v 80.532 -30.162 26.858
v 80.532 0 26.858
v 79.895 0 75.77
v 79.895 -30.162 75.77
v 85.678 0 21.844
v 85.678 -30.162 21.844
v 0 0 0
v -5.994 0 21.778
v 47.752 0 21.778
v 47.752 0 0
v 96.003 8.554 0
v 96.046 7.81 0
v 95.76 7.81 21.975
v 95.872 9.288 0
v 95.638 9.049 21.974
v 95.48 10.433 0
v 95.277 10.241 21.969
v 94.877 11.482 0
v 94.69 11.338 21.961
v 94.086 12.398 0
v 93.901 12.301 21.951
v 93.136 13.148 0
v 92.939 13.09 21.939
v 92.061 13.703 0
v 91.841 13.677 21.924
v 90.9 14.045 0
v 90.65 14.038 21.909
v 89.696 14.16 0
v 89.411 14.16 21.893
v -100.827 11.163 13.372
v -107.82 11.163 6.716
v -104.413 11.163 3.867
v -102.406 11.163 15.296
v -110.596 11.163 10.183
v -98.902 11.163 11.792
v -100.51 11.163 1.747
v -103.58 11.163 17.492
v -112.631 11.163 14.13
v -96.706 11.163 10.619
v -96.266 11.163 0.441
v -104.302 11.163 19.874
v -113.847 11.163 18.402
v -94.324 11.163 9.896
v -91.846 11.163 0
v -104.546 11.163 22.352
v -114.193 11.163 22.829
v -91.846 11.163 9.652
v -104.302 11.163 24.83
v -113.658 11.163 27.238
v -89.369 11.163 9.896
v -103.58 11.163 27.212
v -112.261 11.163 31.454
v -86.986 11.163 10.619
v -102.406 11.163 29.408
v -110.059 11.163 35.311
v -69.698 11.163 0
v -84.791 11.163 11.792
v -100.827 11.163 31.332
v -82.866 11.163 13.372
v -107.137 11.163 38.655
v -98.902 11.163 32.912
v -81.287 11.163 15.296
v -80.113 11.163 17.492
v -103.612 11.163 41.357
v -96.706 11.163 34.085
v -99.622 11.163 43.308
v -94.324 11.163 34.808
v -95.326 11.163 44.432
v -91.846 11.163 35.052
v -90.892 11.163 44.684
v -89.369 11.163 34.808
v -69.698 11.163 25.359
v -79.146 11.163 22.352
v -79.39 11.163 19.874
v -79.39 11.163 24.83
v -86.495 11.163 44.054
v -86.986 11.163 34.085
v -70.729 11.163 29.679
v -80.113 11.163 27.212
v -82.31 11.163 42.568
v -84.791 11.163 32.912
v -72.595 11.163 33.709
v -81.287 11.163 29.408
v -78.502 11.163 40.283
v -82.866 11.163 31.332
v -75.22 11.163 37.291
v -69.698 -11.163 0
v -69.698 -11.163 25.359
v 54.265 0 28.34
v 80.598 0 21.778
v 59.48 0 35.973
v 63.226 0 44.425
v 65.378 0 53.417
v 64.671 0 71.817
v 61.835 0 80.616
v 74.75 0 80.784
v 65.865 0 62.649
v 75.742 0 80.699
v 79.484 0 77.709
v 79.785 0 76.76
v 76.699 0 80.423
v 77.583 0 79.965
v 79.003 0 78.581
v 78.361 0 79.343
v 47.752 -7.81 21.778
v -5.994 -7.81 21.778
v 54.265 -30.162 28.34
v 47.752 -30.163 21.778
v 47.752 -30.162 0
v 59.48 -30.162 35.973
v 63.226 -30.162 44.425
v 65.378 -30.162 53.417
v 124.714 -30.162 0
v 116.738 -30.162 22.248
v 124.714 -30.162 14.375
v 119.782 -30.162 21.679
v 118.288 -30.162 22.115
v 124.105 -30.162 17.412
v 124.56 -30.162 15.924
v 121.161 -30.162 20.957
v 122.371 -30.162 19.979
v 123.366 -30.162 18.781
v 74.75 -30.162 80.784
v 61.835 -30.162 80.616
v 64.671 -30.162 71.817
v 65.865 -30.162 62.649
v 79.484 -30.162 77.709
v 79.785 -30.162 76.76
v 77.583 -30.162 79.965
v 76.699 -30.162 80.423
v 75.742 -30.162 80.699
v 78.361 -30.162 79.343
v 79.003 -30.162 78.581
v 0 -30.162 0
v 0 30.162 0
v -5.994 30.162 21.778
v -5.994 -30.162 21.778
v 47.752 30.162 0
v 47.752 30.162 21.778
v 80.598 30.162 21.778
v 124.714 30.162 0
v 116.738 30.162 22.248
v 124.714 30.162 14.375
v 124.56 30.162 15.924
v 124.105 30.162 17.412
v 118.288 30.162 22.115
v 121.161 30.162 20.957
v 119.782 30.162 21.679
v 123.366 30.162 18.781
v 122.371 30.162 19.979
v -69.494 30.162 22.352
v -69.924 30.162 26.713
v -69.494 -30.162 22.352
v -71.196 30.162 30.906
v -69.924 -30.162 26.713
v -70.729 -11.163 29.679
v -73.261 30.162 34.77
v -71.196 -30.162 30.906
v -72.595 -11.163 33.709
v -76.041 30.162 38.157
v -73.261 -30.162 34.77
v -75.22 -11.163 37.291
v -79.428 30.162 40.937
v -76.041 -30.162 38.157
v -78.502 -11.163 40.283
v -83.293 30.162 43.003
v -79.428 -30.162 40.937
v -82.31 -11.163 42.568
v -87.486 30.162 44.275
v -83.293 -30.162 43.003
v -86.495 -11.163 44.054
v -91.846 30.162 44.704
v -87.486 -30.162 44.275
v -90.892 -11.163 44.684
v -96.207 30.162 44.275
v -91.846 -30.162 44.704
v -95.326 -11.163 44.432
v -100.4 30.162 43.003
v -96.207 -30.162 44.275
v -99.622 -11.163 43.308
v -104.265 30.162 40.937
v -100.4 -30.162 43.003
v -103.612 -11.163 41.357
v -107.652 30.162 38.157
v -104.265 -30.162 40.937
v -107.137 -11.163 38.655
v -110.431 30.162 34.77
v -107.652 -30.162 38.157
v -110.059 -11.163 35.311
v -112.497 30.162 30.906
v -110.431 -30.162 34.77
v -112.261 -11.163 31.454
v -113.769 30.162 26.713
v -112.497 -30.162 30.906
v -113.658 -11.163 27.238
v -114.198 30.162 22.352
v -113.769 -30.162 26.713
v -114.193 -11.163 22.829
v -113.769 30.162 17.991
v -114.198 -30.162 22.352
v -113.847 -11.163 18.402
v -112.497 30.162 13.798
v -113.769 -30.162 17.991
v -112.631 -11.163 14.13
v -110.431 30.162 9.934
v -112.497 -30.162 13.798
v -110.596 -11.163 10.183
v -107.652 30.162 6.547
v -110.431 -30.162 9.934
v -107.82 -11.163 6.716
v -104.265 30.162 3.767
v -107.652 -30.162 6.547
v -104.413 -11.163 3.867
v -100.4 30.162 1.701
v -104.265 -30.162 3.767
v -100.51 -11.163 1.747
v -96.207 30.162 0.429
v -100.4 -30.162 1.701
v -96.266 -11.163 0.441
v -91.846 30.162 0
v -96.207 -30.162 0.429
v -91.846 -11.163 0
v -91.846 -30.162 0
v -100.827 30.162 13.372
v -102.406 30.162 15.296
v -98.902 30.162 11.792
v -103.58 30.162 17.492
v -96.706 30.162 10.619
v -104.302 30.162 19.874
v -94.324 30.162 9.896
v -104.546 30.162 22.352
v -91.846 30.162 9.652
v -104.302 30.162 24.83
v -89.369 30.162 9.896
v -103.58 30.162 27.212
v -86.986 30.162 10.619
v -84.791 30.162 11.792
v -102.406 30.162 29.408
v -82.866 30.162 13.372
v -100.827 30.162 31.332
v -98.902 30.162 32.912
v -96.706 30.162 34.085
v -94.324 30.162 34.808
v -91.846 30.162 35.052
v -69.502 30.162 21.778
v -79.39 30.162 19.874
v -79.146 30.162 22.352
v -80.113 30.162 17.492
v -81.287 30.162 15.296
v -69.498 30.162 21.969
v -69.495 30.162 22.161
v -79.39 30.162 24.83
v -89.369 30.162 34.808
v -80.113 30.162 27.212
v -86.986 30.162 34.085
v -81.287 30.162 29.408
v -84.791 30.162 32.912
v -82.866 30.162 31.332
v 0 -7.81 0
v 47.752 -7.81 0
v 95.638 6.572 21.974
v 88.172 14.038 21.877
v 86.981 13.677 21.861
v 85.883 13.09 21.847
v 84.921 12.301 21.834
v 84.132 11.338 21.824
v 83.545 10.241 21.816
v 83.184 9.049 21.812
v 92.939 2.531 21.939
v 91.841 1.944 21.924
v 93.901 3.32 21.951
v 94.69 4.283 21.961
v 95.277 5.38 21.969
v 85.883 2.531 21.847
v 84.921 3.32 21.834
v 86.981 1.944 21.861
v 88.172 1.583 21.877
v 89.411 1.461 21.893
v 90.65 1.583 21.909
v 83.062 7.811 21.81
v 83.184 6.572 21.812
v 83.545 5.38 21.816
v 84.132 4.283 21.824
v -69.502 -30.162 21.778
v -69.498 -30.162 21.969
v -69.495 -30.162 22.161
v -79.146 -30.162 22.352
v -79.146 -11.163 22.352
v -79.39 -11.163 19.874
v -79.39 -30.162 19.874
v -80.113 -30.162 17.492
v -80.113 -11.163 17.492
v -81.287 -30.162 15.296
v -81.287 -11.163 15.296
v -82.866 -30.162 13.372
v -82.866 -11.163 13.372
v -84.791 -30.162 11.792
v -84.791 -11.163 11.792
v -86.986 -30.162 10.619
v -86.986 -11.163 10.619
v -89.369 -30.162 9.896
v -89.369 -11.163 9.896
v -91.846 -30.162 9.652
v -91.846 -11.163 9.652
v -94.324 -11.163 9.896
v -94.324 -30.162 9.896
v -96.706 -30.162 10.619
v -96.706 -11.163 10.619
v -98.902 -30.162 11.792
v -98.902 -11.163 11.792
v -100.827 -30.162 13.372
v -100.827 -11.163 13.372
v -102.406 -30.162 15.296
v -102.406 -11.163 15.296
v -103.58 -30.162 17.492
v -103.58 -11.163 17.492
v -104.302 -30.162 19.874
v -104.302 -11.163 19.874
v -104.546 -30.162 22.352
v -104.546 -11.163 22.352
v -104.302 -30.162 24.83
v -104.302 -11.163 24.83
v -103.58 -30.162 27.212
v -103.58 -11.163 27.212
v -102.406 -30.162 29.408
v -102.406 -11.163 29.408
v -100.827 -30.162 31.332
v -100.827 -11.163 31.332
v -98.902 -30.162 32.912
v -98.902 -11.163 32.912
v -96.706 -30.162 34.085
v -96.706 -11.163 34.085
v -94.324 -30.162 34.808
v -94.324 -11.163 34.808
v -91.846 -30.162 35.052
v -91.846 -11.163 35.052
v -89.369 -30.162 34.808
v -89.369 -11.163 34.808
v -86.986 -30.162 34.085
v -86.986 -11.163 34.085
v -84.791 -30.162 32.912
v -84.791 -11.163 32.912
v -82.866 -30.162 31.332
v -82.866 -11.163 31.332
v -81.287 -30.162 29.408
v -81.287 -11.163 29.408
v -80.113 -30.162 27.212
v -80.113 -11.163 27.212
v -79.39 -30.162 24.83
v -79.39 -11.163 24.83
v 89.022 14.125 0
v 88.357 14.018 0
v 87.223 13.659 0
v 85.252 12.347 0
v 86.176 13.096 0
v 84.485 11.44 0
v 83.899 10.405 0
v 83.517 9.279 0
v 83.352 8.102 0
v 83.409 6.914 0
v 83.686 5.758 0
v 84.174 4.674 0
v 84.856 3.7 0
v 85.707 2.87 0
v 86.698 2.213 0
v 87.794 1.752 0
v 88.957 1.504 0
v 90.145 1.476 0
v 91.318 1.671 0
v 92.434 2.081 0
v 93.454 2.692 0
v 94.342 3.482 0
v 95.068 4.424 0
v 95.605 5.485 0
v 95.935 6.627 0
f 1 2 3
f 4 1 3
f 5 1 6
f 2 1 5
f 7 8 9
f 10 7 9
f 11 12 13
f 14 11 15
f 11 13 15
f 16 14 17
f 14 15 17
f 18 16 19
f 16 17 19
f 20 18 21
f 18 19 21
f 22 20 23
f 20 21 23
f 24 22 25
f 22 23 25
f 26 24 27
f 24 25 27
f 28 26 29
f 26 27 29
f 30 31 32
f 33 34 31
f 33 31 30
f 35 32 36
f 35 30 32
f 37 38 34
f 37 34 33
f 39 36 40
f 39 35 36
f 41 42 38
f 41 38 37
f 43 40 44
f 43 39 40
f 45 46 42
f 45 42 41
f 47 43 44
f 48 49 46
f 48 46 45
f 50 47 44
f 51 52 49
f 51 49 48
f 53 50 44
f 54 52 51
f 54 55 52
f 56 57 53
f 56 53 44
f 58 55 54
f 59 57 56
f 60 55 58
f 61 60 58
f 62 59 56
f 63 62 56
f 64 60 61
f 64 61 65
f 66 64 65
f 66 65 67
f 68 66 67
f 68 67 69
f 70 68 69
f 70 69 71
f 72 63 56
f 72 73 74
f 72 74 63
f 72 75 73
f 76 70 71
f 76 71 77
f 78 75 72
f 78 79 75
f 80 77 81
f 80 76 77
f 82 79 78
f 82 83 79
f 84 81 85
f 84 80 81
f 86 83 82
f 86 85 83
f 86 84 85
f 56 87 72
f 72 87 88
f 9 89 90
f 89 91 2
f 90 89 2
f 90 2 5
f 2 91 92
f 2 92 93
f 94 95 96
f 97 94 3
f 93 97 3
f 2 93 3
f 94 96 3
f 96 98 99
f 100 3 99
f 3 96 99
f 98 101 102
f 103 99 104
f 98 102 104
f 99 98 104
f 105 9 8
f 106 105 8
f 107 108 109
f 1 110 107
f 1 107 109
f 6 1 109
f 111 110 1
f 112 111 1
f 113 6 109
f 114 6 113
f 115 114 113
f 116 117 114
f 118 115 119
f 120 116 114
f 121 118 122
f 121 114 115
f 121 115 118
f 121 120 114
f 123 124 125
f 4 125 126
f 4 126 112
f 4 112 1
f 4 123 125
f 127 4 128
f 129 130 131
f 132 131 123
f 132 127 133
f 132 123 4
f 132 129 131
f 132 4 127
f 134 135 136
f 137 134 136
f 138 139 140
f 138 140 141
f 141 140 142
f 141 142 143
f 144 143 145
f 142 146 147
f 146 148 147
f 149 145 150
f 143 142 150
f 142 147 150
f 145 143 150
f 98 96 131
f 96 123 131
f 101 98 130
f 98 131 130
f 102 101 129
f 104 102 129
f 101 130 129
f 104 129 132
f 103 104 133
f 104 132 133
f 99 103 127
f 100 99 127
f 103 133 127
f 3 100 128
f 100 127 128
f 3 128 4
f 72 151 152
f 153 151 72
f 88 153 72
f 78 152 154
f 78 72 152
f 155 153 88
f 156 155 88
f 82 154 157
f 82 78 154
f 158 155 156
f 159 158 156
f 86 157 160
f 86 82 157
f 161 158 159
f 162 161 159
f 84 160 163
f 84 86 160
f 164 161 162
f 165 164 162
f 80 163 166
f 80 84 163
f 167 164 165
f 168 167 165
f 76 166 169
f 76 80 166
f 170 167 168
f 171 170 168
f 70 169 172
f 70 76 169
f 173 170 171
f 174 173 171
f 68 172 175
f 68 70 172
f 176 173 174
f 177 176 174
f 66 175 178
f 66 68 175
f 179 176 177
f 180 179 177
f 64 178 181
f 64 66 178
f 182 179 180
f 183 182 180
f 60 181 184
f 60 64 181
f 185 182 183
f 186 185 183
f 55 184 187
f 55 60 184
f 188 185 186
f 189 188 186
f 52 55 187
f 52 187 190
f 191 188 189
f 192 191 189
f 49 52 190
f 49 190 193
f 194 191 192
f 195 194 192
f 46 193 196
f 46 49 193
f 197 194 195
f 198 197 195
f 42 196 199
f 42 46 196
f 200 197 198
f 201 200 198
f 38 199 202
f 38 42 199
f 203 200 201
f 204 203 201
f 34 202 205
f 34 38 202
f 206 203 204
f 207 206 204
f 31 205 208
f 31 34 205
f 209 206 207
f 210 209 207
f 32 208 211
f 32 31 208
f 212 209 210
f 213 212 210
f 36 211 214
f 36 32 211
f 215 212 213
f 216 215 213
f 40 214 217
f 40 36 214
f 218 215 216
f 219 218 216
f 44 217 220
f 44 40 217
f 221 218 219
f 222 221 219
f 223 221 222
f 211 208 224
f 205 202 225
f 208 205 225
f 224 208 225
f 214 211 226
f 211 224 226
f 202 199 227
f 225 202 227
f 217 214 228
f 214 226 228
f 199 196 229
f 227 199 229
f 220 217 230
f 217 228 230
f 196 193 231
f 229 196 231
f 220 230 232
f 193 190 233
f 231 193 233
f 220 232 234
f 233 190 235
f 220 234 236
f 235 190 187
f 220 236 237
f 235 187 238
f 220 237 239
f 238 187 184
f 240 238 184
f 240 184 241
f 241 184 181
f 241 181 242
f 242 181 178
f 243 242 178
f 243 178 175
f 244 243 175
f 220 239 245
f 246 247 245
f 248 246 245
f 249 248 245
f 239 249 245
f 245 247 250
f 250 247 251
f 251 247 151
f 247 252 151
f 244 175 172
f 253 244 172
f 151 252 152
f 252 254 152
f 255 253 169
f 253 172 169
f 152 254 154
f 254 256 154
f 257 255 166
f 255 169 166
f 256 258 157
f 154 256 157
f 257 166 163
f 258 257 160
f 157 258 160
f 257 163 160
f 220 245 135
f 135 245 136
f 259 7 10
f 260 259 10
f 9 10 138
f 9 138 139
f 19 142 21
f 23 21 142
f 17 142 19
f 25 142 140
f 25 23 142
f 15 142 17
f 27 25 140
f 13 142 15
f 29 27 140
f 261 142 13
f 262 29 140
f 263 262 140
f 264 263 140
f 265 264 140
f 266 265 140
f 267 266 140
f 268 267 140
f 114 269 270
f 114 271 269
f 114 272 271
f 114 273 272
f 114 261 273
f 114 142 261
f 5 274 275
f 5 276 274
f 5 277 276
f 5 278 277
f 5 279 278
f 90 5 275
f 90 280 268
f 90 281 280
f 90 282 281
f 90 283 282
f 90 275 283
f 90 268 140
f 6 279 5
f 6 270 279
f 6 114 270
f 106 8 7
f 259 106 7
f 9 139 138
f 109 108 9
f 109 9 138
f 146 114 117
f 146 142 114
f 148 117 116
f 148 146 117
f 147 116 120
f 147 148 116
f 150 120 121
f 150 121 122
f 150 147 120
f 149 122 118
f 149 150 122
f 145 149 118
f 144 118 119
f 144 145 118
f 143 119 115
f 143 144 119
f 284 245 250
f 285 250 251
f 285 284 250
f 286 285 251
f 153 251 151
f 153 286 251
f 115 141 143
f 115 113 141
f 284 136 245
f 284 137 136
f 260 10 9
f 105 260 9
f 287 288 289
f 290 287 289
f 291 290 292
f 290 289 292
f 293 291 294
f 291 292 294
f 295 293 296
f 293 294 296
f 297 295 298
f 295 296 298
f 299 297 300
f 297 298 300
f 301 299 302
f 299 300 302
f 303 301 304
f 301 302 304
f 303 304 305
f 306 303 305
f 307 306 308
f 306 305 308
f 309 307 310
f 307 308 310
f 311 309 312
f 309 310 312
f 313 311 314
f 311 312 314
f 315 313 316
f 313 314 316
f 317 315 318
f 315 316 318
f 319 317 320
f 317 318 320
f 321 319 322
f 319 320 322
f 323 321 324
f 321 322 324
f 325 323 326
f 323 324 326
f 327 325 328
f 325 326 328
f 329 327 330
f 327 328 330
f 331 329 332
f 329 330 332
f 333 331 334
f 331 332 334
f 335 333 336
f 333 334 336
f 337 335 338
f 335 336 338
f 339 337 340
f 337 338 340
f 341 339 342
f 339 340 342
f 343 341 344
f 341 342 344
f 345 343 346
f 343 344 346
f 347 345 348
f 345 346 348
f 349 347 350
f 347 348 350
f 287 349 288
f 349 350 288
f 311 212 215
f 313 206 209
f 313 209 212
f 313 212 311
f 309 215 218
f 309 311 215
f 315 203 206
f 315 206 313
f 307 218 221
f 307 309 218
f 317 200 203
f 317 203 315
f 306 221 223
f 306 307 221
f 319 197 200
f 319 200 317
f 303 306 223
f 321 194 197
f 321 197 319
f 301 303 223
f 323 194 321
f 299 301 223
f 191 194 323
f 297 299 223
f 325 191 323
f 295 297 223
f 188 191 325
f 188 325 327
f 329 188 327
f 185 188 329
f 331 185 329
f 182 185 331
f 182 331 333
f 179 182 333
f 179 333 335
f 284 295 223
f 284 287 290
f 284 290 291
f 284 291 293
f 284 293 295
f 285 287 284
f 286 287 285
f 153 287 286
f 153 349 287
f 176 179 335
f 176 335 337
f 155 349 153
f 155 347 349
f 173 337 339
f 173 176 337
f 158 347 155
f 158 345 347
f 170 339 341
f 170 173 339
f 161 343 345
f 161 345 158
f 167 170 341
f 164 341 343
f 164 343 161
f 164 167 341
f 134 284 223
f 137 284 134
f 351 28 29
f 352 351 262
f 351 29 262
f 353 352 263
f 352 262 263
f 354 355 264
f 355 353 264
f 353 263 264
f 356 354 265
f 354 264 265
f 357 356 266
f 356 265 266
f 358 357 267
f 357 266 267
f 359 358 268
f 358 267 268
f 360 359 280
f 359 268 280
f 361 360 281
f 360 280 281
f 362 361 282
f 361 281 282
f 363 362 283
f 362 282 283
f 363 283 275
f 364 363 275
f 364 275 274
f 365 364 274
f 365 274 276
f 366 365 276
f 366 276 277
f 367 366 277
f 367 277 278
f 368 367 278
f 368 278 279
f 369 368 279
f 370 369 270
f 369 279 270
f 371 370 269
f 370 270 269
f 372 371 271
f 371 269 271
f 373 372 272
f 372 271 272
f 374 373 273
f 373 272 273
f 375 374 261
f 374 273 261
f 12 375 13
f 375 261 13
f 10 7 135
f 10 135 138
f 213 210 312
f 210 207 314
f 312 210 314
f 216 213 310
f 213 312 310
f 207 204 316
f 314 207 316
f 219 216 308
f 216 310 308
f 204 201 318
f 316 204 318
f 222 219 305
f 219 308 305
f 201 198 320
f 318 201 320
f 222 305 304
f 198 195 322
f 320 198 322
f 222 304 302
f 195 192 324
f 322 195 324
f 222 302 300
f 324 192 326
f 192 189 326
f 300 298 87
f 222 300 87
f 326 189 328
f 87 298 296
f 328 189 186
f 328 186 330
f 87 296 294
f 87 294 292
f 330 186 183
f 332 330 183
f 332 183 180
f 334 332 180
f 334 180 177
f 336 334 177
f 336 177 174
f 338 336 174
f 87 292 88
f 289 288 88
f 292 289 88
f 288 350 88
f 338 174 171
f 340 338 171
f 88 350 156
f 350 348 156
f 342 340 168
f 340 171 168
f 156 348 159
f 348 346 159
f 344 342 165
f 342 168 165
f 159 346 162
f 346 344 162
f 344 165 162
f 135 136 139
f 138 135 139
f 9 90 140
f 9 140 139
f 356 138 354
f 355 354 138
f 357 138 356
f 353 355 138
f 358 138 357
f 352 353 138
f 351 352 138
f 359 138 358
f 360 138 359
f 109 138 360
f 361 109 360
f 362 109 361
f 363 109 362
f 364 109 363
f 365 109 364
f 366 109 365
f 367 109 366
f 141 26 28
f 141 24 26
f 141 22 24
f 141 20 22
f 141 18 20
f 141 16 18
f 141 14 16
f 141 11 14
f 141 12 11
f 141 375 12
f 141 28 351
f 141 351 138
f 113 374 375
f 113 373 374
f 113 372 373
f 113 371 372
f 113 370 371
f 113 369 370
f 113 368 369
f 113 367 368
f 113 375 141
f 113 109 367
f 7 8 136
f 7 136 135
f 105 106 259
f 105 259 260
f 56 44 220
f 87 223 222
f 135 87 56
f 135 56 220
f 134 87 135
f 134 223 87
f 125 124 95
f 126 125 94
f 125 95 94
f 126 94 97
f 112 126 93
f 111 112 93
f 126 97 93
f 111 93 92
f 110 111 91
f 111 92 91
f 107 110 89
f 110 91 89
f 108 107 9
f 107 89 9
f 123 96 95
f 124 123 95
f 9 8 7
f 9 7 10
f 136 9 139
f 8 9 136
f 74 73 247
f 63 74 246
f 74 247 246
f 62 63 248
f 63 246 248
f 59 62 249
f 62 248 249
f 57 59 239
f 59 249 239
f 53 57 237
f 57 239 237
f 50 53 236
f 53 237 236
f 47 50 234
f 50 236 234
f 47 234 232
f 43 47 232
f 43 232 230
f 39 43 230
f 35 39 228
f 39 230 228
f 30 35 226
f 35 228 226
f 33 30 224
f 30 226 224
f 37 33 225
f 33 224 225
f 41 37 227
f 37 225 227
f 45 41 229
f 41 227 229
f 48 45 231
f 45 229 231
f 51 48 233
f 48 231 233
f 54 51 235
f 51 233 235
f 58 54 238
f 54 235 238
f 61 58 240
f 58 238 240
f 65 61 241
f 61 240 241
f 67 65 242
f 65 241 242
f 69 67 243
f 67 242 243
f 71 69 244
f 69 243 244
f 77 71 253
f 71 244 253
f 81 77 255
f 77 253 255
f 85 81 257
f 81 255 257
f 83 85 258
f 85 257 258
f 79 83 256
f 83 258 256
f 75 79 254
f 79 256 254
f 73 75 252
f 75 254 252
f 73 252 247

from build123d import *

# Parameters (mm, degrees)
F1_DEPTH = 30.1625
F2_DEPTH = 30.1625
F4_DEPTH = 80.772
F5_W     = 45.212
F5_H     = 91.9793769717
F6_DEPTH = 11.1633
F7_DEPTH = 30.1625
F8_DEPTH = 7.8105
F9_R     = 5.08
F10_R    = 7.874
F11_SIZE = 5.08


with BuildPart() as f1:
    # F0 (on Front) → F1 (new body, symmetric)
    with BuildSketch(Plane.XZ):
        with BuildLine():
            ThreePointArc((-69.4944, 22.352), (-107.6516507731, 38.1572507731), (-91.8464, 0))
            ThreePointArc((-91.8464, 0), (-76.245395903, 6.3451085102), (-69.5017704624, 21.7780358656))
            ThreePointArc((-69.5017704624, 21.7780358656), (-69.4962426916, 22.0649942722), (-69.4944, 22.352))
        make_face()
        with BuildLine():
            ThreePointArc((-79.1464, 22.352), (-82.8661438789, 13.3717438789), (-91.8464, 9.652))
            ThreePointArc((-91.8464, 9.652), (-100.8266561211, 31.3322561211), (-79.1464, 22.352))
        make_face(mode=Mode.SUBTRACT)
        with BuildLine():
            Line((-91.8464, 0), (0, 0))
            Line((0, 0), (-5.9944, 21.7780358656))
            Line((-5.9944, 21.7780358656), (-69.5017704624, 21.7780358656))
            ThreePointArc((-69.5017704624, 21.7780358656), (-76.245395903, 6.3451085102), (-91.8464, 0))
        make_face()
    extrude(amount=F1_DEPTH, both=True)

    # F5 (on face) → F6 (cut, symmetric)
    with BuildSketch(Plane.XZ):
        with Locations((-92.3035815358, 0)):
            Rectangle(F5_W, F5_H)
    extrude(amount=F6_DEPTH, both=True, mode=Mode.SUBTRACT)


with BuildPart() as f1b:
    # F0 (on Front) → F1, piece 2 (new body, symmetric)
    with BuildSketch(Plane.XZ):
        Polygon((47.752, 21.7780358656), (47.752, 0), (124.714, 0), (124.714, 22.352), (80.5979335705, 21.7780358656), align=None)
    extrude(amount=F1_DEPTH, both=True)

    # F0 (on Front) → F2 (join)
    with BuildSketch(Plane.XZ):
        with BuildLine():
            ThreePointArc((61.8345440238, 80.6159156896), (64.5073104258, 48.8719706275), (47.752, 21.7780358656))
            Line((47.752, 21.7780358656), (80.5979335705, 21.7780358656))
            Line((80.5979335705, 21.7780358656), (79.8293879764, 80.8500343649))
            Line((79.8293879764, 80.8500343649), (61.8345440238, 80.6159156896))
        make_face()
    extrude(amount=F2_DEPTH)

    # F3 (on face) → F4 (cut)
    with BuildSketch(Plane(origin=(-0.2696508837, 0, 20.7259227271), x_dir=(0.9999153765, 0, 0.0130092189), z_dir=(-0.0130092189, 0, 0.9999153765))):
        with BuildLine():
            ThreePointArc((96.0382283288, 7.8105), (94.1783563893, 12.3006280605), (89.6882283288, 14.1605))
            ThreePointArc((89.6882283288, 14.1605), (85.1981002683, 3.3203719395), (96.0382283288, 7.8105))
        make_face()
    extrude(amount=-F4_DEPTH, mode=Mode.SUBTRACT)

    # F9
    f9_edges = [f1b.edges().sort_by_distance(p)[0] for p in [
        (79.829388, -15.08125, 80.850034),
    ]]
    fillet(f9_edges, radius=F9_R)

    # F10
    f10_edges = [f1b.edges().sort_by_distance(p)[0] for p in [
        (124.714, 0, 22.352),
    ]]
    fillet(f10_edges, radius=F10_R)

    # F11
    f11_edges = [f1b.edges().sort_by_distance(p)[0] for p in [
        (80.597934, 15.08125, 21.778036),
        (80.597934, -15.08125, 21.778036),
    ]]
    chamfer(f11_edges, length=F11_SIZE)


with BuildPart() as f7:
    # F0 (on Front) → F7 (new body)
    with BuildSketch(Plane.XZ):
        Polygon((-5.9944, 21.7780358656), (0, 0), (47.752, 0), (47.752, 21.7780358656), align=None)
    extrude(amount=-F7_DEPTH)


with BuildPart() as f8:
    # F0 (on Front) → F8 (new body)
    with BuildSketch(Plane.XZ):
        Polygon((-5.9944, 21.7780358656), (0, 0), (47.752, 0), (47.752, 21.7780358656), align=None)
    extrude(amount=F8_DEPTH)


solid = Compound([f1.part, f1b.part, f7.part, f8.part])
